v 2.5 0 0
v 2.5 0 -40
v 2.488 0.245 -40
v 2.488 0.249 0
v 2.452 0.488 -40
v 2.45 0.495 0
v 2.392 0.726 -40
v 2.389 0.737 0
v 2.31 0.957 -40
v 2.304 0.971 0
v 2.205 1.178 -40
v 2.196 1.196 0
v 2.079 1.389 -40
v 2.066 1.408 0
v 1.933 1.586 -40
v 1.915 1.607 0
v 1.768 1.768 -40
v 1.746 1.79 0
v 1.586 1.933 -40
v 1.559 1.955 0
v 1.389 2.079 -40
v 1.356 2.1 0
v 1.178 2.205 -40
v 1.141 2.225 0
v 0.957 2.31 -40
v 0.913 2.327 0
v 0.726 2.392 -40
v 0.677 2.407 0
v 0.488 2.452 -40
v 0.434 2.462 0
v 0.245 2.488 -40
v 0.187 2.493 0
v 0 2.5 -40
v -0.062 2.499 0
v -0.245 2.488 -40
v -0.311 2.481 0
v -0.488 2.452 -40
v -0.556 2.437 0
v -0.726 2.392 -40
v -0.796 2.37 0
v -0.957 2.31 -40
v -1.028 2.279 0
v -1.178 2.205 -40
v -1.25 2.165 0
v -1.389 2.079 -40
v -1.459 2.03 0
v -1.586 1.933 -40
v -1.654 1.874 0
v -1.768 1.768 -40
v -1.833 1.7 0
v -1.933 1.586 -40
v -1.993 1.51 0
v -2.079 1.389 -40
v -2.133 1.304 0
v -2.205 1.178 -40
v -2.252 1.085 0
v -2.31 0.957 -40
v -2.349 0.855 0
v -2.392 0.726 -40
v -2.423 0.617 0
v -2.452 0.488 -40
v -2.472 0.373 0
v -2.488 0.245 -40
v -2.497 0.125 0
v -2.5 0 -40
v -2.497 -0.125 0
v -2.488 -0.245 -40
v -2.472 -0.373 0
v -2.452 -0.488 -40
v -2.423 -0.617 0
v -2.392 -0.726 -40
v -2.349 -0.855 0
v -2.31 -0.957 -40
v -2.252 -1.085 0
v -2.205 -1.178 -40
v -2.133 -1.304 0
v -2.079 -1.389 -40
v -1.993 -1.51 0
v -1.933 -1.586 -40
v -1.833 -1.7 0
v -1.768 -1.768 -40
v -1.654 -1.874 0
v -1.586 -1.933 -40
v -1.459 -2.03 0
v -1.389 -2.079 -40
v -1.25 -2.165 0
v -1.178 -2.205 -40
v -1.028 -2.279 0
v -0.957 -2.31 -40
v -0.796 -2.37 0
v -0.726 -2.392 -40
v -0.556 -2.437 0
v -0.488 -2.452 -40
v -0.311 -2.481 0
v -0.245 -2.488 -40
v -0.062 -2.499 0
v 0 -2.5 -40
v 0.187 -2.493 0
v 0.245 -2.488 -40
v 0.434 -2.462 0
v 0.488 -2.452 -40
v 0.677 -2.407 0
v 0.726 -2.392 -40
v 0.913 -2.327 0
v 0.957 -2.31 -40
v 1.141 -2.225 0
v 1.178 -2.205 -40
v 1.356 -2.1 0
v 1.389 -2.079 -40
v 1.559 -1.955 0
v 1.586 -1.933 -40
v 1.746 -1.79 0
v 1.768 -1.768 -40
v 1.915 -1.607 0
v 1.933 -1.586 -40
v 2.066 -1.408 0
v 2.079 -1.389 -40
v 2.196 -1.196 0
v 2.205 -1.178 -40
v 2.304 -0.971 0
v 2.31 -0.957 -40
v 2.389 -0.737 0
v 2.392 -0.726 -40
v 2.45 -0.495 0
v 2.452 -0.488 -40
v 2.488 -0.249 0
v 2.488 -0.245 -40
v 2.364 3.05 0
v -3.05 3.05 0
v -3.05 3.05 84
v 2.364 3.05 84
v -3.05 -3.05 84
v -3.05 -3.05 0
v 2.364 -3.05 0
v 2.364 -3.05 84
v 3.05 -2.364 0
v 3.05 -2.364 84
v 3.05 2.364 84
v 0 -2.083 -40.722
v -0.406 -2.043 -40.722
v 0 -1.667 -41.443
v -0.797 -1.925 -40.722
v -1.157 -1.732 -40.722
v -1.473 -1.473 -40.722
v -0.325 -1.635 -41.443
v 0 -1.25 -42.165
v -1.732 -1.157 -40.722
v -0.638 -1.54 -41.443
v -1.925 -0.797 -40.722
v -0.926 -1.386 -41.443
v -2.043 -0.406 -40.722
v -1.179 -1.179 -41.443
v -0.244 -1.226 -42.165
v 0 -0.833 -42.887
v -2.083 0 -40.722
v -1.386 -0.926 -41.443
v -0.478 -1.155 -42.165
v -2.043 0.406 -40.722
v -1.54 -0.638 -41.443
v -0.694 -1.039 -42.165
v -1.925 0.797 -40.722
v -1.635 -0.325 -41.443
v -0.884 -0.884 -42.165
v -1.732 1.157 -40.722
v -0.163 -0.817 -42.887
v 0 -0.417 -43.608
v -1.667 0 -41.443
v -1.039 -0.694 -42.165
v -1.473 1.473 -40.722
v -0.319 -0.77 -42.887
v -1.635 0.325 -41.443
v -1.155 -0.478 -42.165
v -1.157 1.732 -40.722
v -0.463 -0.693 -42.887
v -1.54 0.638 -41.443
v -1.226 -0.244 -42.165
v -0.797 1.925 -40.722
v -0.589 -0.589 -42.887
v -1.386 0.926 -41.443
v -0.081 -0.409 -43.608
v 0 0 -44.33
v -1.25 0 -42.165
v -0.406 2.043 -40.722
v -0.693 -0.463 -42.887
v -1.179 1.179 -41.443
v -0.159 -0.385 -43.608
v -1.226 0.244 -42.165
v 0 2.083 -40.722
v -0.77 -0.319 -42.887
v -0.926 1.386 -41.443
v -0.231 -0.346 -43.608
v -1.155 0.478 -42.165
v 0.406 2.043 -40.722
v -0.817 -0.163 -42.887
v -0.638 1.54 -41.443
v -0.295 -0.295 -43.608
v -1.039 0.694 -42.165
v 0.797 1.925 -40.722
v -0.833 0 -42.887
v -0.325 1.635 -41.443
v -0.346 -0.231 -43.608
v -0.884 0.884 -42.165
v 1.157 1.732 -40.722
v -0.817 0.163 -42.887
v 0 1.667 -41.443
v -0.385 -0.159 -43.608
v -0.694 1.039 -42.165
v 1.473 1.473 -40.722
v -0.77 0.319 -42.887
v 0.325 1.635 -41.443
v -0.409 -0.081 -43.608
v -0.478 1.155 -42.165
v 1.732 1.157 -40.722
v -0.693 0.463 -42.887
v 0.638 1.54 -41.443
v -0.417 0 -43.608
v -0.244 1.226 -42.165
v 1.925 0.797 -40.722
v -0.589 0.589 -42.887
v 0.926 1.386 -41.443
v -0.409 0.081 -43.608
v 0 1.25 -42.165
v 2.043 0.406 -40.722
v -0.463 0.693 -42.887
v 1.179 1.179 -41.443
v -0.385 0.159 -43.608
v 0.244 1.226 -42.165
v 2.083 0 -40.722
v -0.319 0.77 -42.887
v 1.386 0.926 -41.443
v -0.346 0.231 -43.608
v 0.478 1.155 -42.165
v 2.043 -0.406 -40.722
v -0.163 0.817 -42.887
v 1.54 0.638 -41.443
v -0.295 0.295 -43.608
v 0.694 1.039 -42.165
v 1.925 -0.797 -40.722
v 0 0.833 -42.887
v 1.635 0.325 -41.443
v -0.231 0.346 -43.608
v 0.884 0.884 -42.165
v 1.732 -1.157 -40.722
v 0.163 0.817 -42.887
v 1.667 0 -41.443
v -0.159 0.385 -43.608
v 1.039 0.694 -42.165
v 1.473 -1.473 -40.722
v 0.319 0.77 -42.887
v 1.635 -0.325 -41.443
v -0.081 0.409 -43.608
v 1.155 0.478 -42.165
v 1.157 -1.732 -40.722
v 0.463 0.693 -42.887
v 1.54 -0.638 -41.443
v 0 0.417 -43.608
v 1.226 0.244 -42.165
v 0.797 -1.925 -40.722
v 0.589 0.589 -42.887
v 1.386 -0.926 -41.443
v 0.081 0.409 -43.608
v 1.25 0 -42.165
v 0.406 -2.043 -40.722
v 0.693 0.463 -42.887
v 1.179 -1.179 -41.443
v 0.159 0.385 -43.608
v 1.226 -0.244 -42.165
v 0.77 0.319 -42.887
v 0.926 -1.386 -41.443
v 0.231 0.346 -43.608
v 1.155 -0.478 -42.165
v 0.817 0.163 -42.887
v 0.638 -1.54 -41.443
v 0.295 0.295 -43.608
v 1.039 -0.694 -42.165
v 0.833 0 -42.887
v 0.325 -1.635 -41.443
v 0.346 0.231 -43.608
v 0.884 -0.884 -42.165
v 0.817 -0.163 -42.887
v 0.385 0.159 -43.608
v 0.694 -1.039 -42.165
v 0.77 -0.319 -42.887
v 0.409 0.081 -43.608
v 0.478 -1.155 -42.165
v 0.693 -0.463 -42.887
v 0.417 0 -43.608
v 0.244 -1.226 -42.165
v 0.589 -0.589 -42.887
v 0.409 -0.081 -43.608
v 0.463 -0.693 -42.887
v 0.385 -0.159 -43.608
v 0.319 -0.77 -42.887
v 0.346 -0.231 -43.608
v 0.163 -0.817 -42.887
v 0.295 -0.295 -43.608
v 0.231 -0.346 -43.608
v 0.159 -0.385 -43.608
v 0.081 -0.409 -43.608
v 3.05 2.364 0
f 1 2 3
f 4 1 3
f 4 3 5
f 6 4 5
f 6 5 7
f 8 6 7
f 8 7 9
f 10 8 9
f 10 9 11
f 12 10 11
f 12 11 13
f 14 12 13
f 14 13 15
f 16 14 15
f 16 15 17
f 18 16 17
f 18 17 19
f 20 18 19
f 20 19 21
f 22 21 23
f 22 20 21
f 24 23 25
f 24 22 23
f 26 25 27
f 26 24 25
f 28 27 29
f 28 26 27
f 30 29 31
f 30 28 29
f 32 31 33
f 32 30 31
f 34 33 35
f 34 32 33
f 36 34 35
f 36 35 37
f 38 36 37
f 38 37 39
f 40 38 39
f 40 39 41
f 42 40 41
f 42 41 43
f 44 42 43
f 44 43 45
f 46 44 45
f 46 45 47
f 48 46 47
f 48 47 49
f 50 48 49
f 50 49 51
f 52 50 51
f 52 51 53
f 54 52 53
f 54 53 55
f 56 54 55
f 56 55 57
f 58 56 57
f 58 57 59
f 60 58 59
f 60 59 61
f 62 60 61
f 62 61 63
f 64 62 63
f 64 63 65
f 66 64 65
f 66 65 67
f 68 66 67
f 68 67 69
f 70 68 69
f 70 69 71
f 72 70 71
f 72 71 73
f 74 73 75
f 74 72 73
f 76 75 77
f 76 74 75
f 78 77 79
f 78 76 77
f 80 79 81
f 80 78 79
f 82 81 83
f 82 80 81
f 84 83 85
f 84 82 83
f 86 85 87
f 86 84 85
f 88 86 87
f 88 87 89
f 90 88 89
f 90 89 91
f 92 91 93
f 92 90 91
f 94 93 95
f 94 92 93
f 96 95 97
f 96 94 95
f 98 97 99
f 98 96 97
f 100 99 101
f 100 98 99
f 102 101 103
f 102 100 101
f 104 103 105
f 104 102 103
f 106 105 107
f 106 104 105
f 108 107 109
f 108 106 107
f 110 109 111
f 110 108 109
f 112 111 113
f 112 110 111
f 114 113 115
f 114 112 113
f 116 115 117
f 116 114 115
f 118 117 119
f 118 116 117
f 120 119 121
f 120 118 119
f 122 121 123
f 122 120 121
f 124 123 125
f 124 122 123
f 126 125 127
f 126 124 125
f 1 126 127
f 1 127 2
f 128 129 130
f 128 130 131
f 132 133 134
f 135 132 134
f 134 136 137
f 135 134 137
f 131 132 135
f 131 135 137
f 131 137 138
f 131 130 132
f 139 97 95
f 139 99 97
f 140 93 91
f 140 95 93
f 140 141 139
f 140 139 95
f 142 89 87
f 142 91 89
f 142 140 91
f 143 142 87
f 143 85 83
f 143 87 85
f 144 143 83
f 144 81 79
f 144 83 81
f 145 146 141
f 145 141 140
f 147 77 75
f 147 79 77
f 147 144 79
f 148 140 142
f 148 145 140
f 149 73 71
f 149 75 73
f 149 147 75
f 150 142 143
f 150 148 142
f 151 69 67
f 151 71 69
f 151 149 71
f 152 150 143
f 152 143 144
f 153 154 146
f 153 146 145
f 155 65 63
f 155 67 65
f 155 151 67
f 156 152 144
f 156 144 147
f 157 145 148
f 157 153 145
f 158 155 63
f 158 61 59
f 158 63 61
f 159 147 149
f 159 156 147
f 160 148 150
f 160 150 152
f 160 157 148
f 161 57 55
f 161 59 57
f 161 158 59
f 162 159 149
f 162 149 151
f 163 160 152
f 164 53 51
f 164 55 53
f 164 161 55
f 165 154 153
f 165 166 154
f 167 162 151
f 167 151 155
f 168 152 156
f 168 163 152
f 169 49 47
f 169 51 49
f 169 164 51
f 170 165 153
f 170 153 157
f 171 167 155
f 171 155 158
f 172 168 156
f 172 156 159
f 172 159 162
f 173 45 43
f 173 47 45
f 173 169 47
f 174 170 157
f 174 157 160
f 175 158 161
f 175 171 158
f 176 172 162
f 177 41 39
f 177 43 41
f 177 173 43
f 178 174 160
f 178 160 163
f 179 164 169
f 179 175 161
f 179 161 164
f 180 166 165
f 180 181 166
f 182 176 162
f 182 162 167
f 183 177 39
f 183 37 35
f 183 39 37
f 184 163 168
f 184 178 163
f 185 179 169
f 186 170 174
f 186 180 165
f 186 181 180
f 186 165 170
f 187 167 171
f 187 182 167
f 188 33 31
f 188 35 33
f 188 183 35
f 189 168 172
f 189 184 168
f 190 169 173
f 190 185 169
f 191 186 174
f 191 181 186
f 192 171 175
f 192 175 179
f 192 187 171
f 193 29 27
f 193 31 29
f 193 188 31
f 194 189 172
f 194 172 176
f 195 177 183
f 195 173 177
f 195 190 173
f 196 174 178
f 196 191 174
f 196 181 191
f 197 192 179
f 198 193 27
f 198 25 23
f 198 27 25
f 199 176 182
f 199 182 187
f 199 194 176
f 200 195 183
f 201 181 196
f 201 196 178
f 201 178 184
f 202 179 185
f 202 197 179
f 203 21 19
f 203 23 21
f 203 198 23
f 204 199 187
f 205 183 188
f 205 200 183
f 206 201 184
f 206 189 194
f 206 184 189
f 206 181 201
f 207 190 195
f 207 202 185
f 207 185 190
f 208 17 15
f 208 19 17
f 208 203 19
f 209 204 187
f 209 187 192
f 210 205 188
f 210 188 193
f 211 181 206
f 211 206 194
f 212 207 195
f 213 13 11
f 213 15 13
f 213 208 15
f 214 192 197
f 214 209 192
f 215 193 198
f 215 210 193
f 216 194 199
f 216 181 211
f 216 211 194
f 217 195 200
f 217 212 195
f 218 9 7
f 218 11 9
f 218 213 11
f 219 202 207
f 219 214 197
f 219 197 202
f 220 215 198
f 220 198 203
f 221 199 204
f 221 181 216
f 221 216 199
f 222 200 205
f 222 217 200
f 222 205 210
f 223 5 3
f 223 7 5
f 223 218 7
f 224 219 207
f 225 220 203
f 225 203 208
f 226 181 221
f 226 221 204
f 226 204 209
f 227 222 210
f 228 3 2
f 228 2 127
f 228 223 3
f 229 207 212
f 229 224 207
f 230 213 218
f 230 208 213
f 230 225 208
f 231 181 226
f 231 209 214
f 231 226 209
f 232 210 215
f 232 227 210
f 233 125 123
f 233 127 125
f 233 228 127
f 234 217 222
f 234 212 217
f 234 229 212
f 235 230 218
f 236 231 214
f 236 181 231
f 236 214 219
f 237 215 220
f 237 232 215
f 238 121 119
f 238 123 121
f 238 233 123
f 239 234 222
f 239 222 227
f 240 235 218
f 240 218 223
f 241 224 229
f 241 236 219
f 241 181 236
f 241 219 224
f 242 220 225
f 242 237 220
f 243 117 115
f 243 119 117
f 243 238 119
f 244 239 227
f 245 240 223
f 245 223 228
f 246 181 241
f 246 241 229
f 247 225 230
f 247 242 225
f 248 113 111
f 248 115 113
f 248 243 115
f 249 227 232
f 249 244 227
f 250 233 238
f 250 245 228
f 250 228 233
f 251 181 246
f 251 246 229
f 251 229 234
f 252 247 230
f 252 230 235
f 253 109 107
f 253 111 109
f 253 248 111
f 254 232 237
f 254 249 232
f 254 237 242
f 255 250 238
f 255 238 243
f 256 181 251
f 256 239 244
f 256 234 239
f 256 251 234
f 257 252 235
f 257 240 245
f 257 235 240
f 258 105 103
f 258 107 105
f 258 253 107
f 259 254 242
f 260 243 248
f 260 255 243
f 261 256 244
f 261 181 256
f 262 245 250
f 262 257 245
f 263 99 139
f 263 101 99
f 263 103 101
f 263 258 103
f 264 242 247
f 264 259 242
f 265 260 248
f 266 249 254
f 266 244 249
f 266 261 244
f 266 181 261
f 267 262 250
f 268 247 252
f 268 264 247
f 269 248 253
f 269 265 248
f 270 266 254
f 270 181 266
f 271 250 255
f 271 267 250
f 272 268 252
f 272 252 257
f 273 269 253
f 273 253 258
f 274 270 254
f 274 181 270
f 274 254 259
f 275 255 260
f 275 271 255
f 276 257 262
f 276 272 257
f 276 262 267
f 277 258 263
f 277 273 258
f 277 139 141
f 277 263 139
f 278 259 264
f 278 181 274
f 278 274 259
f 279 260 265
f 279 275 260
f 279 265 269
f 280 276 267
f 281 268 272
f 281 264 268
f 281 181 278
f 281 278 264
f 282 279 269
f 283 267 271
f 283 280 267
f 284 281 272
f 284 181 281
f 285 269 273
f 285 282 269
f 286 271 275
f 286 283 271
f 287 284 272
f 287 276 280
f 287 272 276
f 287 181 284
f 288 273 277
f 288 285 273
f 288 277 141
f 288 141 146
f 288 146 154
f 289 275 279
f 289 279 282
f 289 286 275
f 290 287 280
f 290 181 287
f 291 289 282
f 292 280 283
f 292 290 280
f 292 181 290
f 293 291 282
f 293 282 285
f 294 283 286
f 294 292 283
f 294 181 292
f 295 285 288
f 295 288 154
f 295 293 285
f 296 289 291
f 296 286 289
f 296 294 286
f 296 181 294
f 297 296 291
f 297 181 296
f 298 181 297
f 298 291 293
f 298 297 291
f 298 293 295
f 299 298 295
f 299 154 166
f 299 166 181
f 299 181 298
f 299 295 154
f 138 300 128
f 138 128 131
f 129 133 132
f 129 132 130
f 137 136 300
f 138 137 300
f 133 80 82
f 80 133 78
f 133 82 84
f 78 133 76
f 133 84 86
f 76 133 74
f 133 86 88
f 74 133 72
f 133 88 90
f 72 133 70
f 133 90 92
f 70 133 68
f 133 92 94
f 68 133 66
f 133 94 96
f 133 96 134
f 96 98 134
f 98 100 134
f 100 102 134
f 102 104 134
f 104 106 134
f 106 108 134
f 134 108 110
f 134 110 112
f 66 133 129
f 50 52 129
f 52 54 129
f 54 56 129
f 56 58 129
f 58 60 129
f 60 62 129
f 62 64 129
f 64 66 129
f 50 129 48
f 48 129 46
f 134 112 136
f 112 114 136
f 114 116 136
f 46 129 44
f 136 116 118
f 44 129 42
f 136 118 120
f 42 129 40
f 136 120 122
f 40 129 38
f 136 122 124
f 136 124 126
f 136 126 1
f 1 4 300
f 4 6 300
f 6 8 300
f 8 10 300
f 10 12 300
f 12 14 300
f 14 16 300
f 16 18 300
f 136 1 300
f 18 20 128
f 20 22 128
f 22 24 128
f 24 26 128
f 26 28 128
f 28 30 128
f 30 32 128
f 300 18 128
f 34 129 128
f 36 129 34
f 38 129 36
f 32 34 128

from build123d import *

# Parameters (mm, degrees)
SKETCH1_W           = 6.1
SKETCH1_H           = 6.1
BOSS_EXTRUDE1_DEPTH = 84
SKETCH1_4_R         = 2.5
BOSS_EXTRUDE2_DEPTH = 40
CHAMFER_BASE_SIZE   = 0.686


with BuildPart() as part:
    # Sketch1 → Boss-Extrude1 (new body)
    with BuildSketch(Plane.XY):
        Rectangle(SKETCH1_W, SKETCH1_H)
    extrude(amount=BOSS_EXTRUDE1_DEPTH)

    # Sketch1<4> → Boss-Extrude2 (add)
    with BuildSketch(Plane.XY):
        Circle(SKETCH1_4_R)
    extrude(amount=-BOSS_EXTRUDE2_DEPTH)

    # Boss-Extrude3 cone 1 section (through the dimple's axis) → Boss-Extrude3 (revolve)
    with BuildSketch(Plane(origin=(0, 0, -40), x_dir=(0, -1, 0), z_dir=(1, 0, 0))):
        Polygon((0, 0), (2.5, 0), (0, 4.330127019), align=None)
    revolve(axis=Axis((0, 0, -40), (0, 0, -1)))

    # chamfer_base
    chamfer_base_edges = [part.edges().sort_by_distance(p)[0] for p in [
        (3.05, 3.05, 42),
        (3.05, -3.05, 42),
    ]]
    chamfer(chamfer_base_edges, length=CHAMFER_BASE_SIZE)


solid = part.part
